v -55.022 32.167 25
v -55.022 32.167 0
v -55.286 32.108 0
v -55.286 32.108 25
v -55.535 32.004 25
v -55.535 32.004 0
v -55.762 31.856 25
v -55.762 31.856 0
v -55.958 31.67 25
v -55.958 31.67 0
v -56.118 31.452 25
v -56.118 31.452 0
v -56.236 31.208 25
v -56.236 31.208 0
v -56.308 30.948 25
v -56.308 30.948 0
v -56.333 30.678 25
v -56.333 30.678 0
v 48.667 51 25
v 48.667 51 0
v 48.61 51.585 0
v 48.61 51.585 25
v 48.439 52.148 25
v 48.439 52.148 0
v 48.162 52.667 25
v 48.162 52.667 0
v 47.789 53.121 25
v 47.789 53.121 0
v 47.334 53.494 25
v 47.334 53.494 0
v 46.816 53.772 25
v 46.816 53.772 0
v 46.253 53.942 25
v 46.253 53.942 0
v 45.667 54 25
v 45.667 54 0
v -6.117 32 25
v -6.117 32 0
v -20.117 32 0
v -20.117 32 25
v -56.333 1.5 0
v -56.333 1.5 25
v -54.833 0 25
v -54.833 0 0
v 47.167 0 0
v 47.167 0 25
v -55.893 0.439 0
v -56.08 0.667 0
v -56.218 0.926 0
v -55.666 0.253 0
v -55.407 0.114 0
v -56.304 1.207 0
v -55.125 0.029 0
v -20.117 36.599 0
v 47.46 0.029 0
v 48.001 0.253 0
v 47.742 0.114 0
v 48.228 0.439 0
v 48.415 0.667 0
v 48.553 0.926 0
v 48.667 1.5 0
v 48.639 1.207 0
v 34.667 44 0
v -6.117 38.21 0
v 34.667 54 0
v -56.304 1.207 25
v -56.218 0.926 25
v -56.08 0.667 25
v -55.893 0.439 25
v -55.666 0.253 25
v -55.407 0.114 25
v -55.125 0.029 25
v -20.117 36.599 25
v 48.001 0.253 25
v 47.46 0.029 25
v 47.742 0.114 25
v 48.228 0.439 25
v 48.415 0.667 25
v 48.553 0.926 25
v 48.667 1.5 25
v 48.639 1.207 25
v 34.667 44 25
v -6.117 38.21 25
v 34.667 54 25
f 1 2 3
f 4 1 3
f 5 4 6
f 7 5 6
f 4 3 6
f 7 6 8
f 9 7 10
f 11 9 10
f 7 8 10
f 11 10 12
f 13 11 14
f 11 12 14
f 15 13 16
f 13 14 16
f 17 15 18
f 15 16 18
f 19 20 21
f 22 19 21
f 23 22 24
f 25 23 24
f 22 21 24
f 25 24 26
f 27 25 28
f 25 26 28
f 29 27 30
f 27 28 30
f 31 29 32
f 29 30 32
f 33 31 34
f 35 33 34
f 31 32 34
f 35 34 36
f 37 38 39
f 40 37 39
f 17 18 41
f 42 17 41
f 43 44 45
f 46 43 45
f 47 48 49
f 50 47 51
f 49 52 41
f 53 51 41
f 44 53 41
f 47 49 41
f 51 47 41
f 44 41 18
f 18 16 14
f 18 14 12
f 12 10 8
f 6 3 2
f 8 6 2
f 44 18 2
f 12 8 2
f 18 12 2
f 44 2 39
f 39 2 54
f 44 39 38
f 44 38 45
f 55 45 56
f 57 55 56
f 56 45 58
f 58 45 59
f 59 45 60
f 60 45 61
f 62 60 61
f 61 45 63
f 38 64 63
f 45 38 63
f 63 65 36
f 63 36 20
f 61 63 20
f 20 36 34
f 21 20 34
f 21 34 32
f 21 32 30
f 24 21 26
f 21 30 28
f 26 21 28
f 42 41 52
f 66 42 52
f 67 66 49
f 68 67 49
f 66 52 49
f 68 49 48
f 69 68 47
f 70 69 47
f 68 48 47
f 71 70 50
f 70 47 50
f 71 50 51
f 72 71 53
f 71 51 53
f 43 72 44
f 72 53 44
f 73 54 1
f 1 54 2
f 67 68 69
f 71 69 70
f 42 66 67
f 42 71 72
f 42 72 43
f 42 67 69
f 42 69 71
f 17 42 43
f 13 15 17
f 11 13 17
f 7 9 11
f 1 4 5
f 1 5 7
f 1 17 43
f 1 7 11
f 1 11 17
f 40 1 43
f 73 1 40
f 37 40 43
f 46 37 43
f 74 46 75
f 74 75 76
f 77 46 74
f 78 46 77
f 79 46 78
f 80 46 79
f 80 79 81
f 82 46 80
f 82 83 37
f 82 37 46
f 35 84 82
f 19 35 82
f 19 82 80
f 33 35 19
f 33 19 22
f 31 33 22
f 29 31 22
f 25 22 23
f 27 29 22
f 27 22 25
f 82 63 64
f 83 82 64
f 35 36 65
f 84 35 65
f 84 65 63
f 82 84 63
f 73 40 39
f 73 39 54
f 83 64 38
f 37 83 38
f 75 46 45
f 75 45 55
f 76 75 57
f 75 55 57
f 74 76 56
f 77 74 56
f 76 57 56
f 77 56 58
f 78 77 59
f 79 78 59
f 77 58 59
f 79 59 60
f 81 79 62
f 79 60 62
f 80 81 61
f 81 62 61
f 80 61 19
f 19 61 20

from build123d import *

# Parameters (mm, degrees)
F1_DEPTH = 25


with BuildPart() as f1:
    # F0 (on Top) → F1 (new body)
    with BuildSketch(Plane.XY):
        with BuildLine():
            ThreePointArc((-55.021506, 32.166502), (-55.958015, 31.67005), (-56.33252, 30.678455))
            Line((-56.33252, 30.678455), (-56.33252, 1.5))
            ThreePointArc((-56.33252, 1.5), (-55.89318, 0.43934), (-54.83252, 0))
            Line((-54.83252, 0), (47.16748, 0))
            ThreePointArc((47.16748, 0), (48.228141, 0.43934), (48.66748, 1.5))
            Line((48.66748, 1.5), (48.66748, 51))
            ThreePointArc((48.66748, 51), (47.788801, 53.12132), (45.66748, 54))
            Line((45.66748, 54), (34.66748, 54))
            Line((34.66748, 54), (34.66748, 44))
            Line((34.66748, 44), (-6.117023, 38.210268))
            Line((-6.117023, 38.210268), (-6.117023, 32))
            Line((-6.117023, 32), (-20.117023, 32))
            Line((-20.117023, 32), (-20.117023, 36.599465))
            Line((-20.117023, 36.599465), (-55.021506, 32.166502))
        make_face()
    extrude(amount=F1_DEPTH)


solid = f1.part
